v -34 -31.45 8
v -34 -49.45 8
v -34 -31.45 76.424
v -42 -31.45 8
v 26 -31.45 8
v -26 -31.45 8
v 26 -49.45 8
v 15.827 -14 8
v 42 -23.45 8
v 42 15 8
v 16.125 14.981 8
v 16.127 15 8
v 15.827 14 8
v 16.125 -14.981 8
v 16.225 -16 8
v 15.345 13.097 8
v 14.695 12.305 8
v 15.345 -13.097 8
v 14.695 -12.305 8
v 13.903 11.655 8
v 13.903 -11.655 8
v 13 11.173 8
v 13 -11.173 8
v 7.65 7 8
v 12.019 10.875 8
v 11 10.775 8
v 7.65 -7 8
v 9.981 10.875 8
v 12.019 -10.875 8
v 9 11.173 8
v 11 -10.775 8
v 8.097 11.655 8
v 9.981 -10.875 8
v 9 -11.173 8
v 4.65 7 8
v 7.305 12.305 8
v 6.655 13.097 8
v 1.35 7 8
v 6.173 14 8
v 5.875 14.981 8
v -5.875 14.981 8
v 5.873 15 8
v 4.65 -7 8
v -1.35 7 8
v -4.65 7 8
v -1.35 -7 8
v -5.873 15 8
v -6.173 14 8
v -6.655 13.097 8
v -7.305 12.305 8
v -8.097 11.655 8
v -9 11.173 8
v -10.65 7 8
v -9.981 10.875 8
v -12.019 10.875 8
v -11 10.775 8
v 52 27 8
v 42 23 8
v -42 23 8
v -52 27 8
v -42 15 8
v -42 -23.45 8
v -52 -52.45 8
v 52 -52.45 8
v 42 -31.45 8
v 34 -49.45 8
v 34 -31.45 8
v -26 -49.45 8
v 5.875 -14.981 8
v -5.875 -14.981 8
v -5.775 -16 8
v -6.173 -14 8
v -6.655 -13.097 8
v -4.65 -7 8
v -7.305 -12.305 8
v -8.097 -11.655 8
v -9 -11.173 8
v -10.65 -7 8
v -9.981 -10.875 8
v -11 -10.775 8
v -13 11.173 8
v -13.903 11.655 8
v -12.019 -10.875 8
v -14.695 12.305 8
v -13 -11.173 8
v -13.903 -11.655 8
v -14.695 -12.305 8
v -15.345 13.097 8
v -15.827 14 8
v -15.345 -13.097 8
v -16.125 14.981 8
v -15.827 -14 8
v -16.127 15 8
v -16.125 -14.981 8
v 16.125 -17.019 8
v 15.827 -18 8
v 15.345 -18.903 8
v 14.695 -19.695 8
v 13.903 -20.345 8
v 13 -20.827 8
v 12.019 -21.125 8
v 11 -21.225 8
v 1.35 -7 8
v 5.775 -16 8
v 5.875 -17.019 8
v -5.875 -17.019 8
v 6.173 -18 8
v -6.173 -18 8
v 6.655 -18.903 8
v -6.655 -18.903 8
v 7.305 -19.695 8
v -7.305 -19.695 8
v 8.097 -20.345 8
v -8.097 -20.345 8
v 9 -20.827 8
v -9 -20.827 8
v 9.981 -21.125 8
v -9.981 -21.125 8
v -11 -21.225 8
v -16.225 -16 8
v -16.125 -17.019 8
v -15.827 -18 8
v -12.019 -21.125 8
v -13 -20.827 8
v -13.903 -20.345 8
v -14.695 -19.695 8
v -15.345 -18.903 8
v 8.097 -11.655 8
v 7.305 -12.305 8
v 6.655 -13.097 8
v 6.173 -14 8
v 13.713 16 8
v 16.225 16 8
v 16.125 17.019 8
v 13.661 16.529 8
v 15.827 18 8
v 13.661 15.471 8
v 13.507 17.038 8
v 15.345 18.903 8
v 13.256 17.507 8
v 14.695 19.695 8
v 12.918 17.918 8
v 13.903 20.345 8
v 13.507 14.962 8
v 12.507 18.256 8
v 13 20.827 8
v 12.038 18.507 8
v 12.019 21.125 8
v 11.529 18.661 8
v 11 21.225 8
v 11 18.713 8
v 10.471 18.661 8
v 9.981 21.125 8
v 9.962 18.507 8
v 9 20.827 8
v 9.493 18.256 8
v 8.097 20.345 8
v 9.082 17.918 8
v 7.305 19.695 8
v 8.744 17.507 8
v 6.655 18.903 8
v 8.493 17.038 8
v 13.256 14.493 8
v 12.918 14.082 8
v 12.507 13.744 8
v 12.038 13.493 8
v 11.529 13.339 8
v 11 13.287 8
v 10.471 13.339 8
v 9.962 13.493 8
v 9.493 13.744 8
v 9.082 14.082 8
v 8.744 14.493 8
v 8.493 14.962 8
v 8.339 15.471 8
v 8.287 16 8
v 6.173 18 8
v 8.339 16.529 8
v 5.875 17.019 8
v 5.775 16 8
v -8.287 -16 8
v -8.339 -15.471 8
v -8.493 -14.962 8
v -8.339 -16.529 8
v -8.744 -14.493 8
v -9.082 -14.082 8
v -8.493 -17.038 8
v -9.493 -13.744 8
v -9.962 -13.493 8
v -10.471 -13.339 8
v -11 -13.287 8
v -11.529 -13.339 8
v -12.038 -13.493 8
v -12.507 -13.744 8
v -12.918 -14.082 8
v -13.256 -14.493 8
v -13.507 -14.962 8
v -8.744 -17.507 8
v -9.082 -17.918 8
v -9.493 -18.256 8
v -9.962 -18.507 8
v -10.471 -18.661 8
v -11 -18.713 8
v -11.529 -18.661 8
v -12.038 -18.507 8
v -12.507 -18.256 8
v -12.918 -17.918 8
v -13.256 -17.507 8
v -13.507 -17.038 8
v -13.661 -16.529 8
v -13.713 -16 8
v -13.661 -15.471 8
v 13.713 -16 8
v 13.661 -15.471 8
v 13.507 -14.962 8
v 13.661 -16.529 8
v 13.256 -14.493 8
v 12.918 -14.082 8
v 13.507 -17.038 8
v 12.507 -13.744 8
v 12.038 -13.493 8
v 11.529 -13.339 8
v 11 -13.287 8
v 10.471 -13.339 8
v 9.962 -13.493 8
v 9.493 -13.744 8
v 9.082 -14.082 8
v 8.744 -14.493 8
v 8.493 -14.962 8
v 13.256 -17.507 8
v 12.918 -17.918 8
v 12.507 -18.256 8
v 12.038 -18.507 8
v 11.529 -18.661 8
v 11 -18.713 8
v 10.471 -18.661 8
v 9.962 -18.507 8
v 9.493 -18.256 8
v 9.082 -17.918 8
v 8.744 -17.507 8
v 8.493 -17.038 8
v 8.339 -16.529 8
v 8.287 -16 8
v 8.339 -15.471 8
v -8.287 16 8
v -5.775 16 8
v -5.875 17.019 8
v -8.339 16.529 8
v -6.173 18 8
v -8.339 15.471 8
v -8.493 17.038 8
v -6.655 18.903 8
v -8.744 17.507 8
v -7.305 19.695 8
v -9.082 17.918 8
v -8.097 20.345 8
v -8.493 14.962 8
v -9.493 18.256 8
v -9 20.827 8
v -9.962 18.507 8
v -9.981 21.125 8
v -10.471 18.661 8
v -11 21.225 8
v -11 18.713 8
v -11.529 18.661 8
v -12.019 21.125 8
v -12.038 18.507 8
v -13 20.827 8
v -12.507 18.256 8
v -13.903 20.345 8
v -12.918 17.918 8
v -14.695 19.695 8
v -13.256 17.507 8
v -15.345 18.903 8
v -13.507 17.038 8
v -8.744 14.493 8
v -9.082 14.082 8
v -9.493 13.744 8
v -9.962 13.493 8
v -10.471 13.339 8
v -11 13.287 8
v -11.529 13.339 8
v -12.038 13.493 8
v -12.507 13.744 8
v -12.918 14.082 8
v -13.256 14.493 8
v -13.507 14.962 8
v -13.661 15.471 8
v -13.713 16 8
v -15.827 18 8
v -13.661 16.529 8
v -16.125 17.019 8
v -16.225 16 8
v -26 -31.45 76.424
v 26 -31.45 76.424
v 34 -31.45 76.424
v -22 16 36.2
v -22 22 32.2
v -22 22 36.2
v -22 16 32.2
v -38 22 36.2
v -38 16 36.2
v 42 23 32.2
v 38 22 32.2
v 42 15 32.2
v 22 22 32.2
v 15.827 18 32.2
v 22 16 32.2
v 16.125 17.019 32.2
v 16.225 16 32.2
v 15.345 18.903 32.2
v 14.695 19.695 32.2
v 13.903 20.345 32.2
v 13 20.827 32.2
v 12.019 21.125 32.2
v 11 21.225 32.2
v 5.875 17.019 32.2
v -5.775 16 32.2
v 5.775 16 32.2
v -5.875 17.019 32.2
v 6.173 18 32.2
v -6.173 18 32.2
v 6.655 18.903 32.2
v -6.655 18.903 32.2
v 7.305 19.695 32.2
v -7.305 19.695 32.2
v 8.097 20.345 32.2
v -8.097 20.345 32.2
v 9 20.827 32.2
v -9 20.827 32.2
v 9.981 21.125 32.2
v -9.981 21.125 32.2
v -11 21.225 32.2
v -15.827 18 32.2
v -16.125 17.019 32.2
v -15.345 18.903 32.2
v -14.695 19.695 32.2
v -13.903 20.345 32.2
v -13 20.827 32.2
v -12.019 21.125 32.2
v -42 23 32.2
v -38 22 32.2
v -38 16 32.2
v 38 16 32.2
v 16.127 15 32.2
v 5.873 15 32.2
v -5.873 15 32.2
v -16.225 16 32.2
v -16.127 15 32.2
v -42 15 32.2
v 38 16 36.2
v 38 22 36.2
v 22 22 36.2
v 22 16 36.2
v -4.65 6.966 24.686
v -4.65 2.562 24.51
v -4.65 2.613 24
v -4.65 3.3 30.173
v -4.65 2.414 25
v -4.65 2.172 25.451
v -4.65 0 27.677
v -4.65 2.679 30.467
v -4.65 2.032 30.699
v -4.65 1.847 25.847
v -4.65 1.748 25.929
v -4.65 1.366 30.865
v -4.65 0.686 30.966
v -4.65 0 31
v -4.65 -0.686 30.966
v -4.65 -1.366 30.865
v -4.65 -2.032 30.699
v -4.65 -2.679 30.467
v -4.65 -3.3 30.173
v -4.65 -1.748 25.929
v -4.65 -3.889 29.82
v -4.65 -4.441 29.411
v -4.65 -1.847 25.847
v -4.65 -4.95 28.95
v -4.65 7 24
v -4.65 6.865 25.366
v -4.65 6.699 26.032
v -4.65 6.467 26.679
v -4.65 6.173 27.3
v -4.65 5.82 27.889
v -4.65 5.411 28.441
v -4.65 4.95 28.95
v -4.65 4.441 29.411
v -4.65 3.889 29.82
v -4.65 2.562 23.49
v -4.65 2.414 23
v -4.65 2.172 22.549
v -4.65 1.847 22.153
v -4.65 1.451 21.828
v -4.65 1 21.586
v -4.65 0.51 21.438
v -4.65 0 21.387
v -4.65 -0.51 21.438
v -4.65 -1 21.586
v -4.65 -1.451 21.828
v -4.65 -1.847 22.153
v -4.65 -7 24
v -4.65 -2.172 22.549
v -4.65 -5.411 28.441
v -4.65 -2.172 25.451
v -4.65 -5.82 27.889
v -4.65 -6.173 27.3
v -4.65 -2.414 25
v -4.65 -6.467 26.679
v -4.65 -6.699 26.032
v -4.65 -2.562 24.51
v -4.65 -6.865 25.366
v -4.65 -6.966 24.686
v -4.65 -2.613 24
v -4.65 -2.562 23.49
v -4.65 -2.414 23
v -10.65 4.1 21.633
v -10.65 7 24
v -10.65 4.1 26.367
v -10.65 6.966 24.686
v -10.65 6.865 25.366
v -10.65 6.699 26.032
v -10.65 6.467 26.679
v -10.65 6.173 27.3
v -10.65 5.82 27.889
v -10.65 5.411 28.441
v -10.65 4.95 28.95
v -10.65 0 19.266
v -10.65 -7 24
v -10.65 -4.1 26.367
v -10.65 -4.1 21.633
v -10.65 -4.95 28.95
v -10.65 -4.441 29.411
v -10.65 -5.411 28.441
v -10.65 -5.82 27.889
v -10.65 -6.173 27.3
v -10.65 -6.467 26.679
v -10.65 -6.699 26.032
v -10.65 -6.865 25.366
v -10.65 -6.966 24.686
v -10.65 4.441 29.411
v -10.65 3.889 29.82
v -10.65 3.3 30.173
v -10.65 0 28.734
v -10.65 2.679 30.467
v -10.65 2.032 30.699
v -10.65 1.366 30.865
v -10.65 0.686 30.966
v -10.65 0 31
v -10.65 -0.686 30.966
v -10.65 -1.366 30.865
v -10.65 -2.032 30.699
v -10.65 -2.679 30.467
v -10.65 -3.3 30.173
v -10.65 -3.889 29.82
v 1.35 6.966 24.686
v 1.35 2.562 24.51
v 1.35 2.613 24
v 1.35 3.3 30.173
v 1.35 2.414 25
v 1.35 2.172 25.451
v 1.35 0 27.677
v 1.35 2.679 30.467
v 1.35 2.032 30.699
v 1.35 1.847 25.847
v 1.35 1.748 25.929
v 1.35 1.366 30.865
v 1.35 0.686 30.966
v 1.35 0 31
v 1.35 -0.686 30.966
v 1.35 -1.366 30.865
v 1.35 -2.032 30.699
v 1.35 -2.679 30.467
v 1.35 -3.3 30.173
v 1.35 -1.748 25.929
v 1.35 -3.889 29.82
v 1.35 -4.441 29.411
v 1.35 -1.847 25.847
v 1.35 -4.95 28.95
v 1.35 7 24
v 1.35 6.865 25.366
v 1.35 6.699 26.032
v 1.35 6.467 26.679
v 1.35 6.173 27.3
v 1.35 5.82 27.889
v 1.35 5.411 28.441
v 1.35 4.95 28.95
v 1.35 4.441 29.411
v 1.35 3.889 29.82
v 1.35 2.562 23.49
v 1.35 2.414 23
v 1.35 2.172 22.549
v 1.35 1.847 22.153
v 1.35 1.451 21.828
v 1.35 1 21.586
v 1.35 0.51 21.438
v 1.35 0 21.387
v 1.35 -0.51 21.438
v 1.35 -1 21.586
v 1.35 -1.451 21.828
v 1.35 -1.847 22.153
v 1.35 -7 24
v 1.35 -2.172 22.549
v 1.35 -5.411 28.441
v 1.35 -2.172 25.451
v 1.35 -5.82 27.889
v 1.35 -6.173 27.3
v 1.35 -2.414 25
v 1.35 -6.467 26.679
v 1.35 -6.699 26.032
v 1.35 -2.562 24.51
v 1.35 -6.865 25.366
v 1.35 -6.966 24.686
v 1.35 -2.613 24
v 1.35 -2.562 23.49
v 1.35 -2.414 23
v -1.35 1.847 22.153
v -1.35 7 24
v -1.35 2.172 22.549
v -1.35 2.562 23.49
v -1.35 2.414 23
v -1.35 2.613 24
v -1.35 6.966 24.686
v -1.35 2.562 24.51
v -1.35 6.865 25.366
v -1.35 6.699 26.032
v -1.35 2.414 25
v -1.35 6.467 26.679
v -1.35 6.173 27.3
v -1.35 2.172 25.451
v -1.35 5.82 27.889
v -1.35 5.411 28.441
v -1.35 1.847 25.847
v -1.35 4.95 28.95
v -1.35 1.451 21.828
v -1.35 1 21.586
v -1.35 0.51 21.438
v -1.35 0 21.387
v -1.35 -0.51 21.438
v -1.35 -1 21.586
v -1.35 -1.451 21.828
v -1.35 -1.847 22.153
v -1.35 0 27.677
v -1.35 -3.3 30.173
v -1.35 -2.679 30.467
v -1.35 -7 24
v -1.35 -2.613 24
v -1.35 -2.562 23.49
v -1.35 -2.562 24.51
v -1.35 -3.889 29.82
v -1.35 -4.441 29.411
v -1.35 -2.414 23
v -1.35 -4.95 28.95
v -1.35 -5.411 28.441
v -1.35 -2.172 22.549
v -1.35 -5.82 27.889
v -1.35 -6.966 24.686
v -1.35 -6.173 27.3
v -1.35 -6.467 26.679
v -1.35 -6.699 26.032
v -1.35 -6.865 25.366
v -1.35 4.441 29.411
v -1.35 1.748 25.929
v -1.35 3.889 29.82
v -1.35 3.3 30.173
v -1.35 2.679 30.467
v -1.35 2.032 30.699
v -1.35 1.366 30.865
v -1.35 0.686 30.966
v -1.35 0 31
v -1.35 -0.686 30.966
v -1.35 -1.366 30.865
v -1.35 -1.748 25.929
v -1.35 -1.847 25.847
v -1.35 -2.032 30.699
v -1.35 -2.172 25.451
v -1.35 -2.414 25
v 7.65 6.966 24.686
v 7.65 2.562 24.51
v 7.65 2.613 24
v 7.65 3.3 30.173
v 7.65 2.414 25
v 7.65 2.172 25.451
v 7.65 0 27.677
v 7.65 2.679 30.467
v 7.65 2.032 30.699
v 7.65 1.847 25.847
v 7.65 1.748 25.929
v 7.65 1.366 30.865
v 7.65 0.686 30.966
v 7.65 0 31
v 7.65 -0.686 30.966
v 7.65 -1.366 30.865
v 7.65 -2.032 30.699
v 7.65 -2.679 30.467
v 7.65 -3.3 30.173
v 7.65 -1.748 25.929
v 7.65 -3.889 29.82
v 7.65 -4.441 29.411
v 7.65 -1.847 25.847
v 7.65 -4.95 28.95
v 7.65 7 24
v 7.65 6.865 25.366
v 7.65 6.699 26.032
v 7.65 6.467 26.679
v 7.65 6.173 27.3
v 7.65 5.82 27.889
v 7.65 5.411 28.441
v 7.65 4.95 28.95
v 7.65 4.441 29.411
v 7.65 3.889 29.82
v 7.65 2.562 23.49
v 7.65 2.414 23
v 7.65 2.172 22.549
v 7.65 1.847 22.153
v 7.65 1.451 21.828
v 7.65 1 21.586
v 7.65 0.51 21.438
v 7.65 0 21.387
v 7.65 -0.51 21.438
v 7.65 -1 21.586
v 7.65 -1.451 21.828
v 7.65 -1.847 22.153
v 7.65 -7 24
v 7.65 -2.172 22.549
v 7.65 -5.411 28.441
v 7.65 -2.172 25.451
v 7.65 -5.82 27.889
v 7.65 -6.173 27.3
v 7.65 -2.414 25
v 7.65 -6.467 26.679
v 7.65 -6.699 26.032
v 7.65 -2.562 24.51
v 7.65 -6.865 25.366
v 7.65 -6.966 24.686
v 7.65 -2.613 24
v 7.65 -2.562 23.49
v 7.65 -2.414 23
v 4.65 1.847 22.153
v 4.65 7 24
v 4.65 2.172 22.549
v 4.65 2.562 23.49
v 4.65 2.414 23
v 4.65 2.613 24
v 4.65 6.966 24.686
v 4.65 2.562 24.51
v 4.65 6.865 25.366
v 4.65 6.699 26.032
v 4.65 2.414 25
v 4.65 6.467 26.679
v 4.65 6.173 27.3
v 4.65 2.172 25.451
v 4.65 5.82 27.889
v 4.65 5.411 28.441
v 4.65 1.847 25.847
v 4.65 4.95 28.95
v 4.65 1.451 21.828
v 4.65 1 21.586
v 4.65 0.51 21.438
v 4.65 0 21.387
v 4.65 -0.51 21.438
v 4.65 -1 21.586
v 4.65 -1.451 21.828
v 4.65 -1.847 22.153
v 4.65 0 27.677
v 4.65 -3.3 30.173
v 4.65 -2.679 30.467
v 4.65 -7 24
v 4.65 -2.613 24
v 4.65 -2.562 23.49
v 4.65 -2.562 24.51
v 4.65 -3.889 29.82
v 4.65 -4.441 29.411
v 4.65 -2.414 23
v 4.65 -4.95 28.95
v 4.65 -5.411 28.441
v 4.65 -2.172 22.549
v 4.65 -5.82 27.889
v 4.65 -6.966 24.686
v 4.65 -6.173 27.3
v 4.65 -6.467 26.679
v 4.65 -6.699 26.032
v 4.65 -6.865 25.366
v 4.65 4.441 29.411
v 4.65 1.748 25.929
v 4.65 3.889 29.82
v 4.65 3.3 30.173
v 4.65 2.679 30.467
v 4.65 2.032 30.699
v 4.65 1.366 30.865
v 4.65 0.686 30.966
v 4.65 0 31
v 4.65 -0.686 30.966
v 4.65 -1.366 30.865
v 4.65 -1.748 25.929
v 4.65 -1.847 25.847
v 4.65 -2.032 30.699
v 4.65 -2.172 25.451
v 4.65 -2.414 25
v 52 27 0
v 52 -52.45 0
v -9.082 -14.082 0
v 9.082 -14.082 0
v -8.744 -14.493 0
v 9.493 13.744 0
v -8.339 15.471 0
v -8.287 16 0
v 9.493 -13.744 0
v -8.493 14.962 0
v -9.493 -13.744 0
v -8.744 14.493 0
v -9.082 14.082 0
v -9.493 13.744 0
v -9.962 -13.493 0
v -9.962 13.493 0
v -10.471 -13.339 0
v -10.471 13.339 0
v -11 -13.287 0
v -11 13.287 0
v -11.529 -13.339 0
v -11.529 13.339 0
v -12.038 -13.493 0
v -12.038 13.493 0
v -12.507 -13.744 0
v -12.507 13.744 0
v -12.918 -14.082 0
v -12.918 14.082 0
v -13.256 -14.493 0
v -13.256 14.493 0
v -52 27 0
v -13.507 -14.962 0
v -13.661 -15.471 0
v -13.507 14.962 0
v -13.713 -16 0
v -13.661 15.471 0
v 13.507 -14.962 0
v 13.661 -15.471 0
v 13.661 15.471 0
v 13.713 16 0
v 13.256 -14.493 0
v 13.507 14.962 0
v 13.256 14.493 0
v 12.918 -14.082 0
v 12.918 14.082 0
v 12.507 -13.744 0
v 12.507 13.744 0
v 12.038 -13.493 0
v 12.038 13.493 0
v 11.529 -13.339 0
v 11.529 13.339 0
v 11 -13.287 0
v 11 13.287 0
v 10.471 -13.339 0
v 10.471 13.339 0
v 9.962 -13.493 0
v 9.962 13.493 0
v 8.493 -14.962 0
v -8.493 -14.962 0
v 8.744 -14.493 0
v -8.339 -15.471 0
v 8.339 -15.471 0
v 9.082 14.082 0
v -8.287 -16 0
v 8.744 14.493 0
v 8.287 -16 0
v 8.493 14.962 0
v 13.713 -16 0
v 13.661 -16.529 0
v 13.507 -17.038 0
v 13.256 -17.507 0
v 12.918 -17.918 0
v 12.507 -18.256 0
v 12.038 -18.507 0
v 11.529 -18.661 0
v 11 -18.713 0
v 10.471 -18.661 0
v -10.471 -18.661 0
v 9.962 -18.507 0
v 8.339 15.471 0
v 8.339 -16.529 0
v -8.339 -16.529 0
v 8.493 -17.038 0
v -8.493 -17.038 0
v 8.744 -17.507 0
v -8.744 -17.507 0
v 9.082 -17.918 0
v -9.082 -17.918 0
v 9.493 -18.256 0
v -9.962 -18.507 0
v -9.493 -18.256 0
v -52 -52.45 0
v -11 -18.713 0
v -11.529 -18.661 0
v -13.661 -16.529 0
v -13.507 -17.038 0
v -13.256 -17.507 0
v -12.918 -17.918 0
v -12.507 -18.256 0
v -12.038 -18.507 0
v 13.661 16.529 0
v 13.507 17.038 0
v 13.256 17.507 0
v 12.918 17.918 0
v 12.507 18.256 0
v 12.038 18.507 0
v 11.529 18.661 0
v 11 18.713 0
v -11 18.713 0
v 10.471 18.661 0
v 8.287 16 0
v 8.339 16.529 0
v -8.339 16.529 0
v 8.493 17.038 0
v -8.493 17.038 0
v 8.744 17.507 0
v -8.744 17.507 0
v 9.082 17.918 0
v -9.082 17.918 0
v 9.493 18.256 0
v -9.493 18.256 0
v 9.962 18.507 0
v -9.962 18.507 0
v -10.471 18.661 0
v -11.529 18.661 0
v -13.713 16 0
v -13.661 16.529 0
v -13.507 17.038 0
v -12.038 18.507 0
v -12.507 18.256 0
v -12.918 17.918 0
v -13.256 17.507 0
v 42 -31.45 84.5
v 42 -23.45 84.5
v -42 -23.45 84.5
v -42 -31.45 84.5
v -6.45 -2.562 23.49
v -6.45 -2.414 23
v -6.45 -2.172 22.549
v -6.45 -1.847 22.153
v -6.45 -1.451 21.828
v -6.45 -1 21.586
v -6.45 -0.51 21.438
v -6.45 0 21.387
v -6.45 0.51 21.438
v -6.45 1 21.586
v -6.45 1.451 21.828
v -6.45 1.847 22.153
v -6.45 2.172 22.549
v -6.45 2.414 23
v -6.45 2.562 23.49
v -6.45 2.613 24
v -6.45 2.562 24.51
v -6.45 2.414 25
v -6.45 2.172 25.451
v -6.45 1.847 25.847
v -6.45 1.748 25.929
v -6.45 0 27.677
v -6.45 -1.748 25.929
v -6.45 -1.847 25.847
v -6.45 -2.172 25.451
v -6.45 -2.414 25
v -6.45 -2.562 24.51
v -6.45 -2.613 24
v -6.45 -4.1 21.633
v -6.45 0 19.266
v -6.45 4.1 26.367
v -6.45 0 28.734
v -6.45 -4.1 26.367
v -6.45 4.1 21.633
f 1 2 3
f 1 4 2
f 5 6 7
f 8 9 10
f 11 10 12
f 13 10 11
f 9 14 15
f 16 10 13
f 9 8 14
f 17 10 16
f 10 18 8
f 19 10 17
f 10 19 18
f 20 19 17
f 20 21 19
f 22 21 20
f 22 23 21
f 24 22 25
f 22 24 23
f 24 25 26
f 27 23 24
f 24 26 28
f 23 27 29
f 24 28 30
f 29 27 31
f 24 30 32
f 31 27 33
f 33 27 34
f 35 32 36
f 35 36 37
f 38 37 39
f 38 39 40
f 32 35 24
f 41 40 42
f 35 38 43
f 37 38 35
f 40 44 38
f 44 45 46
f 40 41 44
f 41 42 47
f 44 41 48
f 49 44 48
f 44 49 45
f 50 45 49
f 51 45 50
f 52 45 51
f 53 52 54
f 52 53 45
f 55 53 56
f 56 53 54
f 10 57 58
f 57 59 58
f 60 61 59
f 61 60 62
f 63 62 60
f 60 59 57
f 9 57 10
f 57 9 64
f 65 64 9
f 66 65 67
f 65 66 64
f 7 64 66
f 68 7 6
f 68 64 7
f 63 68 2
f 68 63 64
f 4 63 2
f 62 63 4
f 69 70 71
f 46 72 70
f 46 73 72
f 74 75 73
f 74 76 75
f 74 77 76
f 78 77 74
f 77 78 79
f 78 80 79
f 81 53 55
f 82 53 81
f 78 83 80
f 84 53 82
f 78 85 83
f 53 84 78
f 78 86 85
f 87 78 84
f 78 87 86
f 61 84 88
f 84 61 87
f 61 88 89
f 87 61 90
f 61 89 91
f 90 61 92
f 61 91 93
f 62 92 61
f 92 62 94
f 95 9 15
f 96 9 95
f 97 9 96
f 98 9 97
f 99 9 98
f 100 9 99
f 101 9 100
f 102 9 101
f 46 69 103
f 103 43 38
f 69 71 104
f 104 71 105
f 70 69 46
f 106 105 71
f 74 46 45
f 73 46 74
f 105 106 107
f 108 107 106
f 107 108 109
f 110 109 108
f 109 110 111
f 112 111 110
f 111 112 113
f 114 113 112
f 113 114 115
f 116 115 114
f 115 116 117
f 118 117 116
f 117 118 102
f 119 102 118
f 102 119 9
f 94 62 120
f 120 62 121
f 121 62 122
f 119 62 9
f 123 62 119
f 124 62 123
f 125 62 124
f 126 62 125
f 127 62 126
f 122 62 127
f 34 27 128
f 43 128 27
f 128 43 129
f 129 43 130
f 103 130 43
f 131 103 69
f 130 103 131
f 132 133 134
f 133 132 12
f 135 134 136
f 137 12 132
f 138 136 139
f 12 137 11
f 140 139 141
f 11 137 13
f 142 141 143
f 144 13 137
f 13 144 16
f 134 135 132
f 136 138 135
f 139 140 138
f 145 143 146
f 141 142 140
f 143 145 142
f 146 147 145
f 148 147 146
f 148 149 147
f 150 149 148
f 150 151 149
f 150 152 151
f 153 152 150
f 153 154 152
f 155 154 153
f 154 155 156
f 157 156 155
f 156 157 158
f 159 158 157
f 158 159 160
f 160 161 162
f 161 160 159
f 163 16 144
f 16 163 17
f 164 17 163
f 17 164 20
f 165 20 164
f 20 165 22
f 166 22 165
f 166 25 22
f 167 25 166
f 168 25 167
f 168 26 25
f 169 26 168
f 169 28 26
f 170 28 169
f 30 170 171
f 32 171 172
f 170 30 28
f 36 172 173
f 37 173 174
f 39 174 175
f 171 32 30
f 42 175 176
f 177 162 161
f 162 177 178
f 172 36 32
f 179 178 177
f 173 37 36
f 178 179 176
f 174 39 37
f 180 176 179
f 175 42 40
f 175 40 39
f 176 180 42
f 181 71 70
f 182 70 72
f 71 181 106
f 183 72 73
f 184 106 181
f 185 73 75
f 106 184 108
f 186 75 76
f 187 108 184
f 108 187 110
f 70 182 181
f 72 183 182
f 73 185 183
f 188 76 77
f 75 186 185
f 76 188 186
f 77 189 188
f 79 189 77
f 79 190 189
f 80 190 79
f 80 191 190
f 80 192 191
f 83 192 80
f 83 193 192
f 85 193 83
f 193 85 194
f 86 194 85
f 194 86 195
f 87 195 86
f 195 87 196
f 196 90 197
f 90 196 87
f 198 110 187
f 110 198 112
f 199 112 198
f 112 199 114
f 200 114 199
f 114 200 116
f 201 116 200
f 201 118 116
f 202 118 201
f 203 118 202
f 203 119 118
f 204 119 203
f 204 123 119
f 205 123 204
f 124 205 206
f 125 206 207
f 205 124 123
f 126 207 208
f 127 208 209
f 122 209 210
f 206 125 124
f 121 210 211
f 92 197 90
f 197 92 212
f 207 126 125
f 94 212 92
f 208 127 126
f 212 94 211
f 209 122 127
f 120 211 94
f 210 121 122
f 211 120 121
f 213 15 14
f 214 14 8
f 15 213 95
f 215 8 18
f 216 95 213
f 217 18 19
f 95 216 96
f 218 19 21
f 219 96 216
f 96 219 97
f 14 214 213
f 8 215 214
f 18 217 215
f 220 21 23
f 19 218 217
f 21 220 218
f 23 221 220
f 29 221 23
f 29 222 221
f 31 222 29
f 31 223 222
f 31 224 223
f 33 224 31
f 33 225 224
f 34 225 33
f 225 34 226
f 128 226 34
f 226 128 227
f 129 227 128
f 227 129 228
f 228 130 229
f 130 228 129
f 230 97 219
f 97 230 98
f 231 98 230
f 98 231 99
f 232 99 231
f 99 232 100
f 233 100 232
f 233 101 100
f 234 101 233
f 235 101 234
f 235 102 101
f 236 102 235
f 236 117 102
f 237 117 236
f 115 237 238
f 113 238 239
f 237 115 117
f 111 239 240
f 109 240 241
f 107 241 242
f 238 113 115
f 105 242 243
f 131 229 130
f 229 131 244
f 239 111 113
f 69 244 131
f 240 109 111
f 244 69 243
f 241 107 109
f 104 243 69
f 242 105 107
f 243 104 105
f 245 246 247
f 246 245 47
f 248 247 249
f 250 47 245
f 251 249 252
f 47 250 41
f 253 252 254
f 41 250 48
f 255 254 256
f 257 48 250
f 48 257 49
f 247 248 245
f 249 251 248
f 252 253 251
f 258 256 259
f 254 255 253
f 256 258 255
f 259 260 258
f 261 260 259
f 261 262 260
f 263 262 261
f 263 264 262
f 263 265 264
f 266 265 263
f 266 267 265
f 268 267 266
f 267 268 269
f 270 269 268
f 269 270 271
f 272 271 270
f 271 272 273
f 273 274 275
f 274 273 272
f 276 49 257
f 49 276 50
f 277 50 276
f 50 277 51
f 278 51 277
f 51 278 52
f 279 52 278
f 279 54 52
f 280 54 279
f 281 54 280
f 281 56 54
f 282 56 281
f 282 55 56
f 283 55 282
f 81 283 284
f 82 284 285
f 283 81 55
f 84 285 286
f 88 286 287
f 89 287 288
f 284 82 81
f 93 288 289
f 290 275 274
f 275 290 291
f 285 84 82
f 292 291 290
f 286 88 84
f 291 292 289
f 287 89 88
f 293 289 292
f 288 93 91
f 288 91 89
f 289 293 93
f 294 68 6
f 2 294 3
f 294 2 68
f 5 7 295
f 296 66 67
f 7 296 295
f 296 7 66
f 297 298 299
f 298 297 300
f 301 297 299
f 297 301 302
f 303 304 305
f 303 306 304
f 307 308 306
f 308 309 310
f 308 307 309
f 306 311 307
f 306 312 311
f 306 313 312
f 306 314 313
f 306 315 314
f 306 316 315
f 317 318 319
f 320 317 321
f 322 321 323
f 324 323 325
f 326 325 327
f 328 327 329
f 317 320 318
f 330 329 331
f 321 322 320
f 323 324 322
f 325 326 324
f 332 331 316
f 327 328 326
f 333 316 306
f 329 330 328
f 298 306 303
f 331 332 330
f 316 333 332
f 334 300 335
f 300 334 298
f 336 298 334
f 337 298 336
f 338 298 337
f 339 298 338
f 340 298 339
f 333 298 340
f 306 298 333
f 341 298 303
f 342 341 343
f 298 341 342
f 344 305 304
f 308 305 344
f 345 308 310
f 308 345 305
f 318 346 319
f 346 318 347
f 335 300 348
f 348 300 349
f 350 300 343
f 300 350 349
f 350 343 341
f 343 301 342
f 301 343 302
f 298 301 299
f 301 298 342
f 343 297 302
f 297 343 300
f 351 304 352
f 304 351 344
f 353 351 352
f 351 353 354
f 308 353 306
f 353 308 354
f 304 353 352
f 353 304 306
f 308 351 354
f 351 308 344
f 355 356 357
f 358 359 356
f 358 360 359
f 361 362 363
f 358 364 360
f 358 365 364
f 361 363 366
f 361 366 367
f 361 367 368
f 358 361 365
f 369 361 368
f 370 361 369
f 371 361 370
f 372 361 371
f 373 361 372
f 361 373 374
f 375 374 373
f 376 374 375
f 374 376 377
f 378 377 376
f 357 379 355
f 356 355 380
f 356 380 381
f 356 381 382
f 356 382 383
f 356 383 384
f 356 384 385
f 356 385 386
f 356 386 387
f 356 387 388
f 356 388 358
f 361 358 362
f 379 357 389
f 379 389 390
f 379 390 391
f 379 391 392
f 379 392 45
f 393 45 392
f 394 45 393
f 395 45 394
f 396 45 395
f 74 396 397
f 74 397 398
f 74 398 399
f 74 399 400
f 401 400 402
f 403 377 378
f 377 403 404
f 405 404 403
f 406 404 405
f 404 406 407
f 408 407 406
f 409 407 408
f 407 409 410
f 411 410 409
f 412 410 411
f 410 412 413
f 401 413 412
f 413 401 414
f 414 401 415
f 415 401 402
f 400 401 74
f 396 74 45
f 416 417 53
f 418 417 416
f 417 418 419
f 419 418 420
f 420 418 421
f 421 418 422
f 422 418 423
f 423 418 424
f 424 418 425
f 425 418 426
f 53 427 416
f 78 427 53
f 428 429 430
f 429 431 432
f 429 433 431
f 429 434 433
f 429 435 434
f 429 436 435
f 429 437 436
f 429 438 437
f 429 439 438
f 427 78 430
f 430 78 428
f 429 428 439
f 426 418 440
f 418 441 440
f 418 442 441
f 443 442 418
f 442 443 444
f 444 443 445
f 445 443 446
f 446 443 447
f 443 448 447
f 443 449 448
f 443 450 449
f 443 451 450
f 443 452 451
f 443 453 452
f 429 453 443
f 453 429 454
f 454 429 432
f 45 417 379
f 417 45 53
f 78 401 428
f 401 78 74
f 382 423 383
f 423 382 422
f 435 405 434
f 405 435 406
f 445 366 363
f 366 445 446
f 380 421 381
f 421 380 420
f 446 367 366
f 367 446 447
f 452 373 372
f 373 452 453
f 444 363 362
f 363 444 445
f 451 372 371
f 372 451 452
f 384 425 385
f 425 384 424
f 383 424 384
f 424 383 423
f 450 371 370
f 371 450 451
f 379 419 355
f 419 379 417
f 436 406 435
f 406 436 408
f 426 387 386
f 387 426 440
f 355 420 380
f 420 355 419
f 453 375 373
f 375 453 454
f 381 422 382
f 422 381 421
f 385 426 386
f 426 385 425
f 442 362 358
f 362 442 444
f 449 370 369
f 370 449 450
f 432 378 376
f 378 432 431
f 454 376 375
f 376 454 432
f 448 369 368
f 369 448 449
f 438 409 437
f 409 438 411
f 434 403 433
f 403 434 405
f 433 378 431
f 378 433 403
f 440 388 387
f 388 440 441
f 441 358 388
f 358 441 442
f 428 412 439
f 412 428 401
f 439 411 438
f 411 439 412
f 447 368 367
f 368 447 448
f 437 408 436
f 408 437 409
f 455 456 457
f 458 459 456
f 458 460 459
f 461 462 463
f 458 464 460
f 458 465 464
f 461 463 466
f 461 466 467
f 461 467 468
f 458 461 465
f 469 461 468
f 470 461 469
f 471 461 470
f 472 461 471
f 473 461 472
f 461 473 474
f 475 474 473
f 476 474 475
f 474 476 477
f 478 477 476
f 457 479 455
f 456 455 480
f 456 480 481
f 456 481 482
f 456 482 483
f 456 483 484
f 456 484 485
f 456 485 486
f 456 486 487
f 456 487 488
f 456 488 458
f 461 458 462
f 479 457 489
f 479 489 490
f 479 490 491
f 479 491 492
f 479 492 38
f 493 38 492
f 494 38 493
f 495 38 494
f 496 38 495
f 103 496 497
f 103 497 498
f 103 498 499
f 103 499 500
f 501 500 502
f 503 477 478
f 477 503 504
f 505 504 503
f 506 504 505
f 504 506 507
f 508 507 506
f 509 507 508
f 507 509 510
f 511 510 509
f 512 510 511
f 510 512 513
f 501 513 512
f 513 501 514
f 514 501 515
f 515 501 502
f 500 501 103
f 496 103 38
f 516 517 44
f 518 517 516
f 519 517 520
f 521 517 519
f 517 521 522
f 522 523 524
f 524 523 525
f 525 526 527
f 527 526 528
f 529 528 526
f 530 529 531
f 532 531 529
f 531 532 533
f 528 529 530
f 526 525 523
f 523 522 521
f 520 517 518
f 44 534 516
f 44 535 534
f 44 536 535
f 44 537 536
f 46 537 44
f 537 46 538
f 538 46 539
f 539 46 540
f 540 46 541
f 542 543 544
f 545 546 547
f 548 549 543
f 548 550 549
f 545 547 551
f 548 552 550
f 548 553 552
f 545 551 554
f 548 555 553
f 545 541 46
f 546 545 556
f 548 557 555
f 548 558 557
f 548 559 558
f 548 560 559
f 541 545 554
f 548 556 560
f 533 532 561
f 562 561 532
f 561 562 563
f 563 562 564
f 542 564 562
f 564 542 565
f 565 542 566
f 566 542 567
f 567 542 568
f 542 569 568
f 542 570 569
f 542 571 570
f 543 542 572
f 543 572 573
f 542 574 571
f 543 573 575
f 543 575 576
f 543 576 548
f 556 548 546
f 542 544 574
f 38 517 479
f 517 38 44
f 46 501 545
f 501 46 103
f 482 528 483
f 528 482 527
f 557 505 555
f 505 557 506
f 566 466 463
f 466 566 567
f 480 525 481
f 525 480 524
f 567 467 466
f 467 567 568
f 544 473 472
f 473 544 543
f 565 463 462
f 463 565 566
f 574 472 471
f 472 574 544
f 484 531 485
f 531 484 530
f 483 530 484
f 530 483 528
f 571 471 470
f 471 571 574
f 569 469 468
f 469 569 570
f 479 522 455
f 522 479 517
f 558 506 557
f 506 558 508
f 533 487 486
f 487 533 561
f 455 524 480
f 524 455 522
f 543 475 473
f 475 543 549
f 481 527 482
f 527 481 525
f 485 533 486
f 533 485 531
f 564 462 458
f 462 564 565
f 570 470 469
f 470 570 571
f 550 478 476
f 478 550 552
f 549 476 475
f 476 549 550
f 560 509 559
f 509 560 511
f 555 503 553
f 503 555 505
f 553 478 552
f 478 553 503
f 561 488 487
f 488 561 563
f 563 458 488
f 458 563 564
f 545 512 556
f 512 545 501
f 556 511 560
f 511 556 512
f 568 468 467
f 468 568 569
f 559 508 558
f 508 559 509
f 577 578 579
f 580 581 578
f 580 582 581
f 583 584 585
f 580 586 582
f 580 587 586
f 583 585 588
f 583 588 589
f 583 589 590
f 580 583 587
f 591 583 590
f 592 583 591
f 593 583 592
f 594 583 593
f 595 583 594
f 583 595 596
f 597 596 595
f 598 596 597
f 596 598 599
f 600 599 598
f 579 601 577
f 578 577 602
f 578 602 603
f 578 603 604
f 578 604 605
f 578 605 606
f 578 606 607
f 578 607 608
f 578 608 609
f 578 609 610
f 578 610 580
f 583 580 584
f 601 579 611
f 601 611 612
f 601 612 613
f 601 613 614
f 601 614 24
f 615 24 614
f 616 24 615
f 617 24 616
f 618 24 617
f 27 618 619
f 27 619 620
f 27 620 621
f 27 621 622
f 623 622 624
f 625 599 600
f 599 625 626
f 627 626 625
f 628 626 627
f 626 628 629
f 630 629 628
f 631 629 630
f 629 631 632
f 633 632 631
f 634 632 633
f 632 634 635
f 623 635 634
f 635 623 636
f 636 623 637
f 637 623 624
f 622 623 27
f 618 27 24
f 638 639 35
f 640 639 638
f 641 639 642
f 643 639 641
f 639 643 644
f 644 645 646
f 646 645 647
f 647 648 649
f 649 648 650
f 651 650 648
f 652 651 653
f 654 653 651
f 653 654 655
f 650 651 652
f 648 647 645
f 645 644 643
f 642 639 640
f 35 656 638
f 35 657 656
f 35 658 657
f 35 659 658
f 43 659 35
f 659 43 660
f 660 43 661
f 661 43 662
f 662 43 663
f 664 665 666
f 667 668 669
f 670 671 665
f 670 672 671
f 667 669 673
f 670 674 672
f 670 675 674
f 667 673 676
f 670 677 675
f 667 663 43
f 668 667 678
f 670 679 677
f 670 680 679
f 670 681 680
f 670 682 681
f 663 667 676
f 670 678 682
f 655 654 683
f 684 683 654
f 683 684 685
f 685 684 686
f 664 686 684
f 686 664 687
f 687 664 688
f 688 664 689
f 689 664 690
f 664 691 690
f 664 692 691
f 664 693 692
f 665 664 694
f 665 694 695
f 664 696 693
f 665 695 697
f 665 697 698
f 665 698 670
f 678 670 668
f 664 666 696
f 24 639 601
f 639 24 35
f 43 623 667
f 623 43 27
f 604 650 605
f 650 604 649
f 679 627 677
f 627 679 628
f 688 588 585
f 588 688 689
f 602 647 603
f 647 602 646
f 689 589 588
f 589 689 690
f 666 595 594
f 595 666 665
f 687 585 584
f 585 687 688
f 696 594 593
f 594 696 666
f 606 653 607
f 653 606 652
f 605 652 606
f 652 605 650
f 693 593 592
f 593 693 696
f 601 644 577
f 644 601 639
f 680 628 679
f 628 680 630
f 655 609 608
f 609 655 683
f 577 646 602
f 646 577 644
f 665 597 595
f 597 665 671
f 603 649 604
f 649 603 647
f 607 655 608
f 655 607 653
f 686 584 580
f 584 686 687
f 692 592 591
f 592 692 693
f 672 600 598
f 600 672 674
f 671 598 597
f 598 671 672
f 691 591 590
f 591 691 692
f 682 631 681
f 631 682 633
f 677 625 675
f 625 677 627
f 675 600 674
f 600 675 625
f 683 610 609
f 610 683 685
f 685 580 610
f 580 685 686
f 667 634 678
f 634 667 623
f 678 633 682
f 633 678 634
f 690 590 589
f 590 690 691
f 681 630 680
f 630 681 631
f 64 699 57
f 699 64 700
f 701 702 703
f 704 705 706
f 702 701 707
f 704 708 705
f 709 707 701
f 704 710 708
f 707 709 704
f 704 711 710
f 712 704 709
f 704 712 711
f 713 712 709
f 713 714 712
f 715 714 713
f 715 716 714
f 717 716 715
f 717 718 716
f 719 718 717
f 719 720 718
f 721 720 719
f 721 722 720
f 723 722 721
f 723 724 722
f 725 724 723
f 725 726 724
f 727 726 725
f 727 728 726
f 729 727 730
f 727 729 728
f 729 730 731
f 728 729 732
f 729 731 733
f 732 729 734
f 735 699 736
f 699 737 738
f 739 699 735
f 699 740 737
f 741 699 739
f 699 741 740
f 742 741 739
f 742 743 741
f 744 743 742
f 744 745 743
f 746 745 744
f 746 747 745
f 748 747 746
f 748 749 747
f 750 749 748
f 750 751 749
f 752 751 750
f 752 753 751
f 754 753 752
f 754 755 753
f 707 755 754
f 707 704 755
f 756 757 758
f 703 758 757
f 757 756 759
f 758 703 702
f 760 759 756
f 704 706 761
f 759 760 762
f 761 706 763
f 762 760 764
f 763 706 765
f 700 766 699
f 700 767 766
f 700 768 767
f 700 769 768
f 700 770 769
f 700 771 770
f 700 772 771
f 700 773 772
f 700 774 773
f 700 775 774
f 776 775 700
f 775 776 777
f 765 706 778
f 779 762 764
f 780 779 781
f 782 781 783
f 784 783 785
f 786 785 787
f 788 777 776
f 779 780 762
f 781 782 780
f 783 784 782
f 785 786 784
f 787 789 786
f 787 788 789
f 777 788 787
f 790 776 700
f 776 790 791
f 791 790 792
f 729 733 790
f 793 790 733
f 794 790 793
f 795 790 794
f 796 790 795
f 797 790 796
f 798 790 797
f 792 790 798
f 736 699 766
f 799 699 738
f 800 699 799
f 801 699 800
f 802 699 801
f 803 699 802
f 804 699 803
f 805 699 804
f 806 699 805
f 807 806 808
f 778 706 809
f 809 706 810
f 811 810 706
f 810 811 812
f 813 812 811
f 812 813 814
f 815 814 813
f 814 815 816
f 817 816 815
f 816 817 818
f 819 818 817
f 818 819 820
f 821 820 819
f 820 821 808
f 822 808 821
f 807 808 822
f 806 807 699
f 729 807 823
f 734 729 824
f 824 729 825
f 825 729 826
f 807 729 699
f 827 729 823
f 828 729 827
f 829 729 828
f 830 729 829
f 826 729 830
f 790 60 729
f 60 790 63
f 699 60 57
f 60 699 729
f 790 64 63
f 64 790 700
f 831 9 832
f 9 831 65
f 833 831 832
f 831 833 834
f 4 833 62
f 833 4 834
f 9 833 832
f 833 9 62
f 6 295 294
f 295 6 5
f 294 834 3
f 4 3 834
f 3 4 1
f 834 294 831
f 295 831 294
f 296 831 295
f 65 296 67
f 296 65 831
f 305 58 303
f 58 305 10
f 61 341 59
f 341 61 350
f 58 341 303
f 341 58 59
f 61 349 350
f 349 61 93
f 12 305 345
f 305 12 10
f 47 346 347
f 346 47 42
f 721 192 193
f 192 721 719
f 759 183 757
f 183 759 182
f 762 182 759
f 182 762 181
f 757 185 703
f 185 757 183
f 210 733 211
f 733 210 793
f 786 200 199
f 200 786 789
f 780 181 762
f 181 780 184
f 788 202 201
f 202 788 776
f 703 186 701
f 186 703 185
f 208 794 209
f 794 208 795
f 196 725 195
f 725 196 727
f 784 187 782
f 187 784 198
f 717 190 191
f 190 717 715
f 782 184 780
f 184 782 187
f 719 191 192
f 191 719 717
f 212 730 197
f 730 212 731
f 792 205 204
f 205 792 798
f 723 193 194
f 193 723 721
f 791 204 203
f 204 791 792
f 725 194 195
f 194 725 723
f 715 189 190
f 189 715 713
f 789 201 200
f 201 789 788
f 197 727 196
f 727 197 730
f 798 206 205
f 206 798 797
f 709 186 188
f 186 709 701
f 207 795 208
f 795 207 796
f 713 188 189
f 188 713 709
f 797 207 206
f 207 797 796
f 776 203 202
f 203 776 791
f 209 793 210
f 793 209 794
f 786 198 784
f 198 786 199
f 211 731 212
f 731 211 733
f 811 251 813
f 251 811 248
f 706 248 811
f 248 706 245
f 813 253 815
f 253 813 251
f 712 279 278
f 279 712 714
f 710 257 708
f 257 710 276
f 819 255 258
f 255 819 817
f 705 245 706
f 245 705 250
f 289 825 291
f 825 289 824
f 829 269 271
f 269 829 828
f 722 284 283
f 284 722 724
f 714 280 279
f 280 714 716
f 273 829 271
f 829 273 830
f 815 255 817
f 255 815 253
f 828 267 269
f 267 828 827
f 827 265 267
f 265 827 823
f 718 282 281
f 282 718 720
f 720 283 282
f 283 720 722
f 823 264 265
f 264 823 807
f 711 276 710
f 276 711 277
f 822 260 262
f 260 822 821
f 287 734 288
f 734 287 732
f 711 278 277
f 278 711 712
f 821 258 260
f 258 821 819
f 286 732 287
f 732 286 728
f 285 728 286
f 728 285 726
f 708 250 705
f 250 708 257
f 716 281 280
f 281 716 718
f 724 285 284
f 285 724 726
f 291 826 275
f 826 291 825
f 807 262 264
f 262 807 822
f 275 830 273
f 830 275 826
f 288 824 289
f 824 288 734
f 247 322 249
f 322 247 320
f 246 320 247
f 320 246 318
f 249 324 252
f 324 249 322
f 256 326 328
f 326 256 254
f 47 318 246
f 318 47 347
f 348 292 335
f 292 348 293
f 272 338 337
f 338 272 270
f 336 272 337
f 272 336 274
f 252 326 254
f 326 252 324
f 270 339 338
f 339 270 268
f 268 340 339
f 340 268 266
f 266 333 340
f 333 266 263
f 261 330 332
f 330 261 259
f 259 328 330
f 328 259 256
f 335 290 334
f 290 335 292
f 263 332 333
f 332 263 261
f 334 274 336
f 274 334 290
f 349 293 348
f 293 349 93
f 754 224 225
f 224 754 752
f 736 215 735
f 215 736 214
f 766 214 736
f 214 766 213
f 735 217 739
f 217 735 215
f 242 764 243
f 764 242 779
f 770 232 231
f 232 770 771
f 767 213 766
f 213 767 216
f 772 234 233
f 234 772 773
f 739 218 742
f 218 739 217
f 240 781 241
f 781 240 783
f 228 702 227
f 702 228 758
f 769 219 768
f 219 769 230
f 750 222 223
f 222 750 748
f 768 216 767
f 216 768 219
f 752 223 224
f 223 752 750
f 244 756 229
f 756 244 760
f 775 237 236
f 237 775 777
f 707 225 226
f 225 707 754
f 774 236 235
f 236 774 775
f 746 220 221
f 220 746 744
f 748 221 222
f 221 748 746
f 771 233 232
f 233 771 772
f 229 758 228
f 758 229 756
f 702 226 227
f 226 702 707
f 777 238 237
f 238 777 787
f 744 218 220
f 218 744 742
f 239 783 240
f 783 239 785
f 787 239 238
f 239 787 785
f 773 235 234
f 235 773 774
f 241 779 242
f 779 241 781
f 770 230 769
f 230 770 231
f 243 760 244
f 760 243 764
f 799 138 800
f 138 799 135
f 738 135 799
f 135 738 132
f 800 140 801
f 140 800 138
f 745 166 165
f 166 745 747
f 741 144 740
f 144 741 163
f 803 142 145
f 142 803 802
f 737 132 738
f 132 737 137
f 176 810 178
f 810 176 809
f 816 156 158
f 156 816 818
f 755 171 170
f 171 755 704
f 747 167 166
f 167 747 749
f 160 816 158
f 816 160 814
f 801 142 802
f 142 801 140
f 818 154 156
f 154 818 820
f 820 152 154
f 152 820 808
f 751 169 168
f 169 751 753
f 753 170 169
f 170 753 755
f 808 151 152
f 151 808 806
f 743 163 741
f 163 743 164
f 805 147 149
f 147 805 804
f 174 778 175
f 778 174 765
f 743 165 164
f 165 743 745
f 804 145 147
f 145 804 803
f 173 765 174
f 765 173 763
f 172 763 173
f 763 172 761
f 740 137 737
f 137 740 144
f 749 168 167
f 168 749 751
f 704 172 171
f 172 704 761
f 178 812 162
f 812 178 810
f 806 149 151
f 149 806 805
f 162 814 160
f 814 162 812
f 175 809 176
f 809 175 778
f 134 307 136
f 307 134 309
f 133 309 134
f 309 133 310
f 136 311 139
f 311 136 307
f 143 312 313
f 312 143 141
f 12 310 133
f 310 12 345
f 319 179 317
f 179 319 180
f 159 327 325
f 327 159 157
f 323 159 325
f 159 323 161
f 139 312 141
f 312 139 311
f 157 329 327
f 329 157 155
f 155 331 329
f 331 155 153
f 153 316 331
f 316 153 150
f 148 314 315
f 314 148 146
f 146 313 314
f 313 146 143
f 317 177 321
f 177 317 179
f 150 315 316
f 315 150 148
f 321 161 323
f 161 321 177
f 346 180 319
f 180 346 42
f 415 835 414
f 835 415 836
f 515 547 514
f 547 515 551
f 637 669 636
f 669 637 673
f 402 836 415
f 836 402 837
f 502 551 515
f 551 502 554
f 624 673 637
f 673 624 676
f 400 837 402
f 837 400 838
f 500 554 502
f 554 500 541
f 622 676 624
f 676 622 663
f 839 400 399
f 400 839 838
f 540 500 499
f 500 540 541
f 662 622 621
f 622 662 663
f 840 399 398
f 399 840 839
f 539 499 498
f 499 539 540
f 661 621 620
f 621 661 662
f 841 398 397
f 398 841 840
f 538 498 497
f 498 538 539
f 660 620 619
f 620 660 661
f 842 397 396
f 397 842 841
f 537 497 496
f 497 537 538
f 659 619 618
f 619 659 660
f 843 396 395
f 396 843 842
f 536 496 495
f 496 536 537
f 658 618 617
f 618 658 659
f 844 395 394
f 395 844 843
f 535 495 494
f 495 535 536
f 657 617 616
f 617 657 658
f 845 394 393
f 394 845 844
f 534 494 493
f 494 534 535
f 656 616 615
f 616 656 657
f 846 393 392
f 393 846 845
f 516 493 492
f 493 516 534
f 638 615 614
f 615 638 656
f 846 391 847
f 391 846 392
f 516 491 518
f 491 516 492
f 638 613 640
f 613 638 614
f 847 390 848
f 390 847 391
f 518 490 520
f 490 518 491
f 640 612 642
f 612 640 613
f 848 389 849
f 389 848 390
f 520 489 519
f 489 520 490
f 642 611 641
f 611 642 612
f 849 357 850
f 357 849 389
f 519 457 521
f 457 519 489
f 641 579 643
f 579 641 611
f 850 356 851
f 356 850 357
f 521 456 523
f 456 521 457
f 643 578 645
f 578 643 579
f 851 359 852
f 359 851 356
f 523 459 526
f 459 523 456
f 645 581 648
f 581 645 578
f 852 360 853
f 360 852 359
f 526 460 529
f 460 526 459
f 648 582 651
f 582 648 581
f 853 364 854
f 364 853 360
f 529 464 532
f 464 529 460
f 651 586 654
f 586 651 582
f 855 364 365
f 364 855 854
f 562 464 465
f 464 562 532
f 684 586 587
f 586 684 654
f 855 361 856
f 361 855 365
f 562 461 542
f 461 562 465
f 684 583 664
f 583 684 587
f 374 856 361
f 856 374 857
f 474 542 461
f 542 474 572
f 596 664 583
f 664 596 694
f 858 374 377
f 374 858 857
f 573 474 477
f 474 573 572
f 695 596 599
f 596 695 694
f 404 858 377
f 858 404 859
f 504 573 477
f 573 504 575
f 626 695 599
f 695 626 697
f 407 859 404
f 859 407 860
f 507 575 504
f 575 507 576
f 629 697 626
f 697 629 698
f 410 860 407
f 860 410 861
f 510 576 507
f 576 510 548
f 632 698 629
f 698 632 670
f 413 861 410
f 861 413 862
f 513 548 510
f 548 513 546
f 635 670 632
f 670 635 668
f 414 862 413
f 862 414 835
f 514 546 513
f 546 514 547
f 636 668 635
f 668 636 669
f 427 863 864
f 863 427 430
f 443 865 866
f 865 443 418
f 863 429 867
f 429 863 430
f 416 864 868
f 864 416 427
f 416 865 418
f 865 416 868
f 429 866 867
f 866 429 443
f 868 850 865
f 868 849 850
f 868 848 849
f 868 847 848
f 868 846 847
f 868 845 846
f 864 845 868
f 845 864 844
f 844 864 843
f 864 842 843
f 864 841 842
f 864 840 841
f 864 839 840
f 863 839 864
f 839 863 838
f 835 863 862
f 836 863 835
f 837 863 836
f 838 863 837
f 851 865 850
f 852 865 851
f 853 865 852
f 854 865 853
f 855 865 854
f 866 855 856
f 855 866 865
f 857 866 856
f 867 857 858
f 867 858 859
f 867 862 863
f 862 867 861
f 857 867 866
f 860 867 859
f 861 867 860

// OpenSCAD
// DJI osmo Action 6固定部品: rear plate + front support, one FDM solid.
// mm; +Y camera front; X screw axis; Z print up. Case shape provisional.
show_case=false;
tab_t=3; tab_gap=3; case_hole=5; body_to_axis=12.5;
fit=0.3; hole_allow=0.2;
case_w=95; case_d=45.9; case_h=75;
rear_gap=0.5; // fit with measured shim/liner, not an operating gap
base_w=104; base_t=8; axis_z=24;
plate_w=84; plate_t=8; plate_above_bottom=48;
rear_gusset_run=18; gusset_t=8; gusset_x=30;
front_y=19; front_wall_t=8; front_span=84;
front_pad_w=16; front_pad_d=6; front_pad_x=30;
front_pad_raise=4; front_gap=0.3;
lug_r=7; nut_side_t=6; head_side_t=3;
nut_af=8.2; nut_depth=4.2; tool_r=14;
$fn=64; eps=0.02;
mid=tab_gap-fit; slot=tab_t+fit;
stack=nut_side_t+2*slot+mid+head_side_t;
left=-(slot+mid/2+nut_side_t);
body_z=axis_z+body_to_axis;
contact_z=body_z-front_gap;
front_top=contact_z-front_pad_raise;
rear_face=-case_d/2-rear_gap; rear_back=rear_face-plate_t;
base_y0=rear_back-rear_gusset_run-3;
base_y1=front_y+front_wall_t/2+4;
plate_top=body_z+plate_above_bottom;
assert(mid>0 && nut_depth<nut_side_t-1);
assert(front_y-front_wall_t/2>tool_r && axis_z-tool_r>base_t);
assert(plate_above_bottom<case_h-15);
assert(gusset_x+gusset_t/2<plate_w/2);
assert(front_pad_x+front_pad_w/2<front_span/2);
assert(rear_gap>=0 && front_gap>=0);
module hole(d,h) { cylinder(d=d/cos(180/32),h=h,$fn=32); }
module roof_hole_x(d,h) {
 r=d/2;
 rotate([0,90,0]) linear_extrude(h) union() {
  circle(r=r/cos(180/32),$fn=32);
  polygon([[-sqrt(2)*r,0],[-r/sqrt(2),r/sqrt(2)],[-r/sqrt(2),-r/sqrt(2)]]);
 }
}
module rear_gusset(x) {
 translate([x-gusset_t/2,0,0])
 multmatrix([[0,0,1,0],[1,0,0,0],[0,1,0,0],[0,0,0,1]])
 linear_extrude(gusset_t)
 polygon([[rear_back-rear_gusset_run,base_t],[rear_back+eps,base_t],[rear_back+eps,plate_top-8]]);
}
module body() {
 difference() {
  union() {
   translate([-base_w/2,base_y0,0]) cube([base_w,base_y1-base_y0,base_t]);
   translate([-plate_w/2,rear_back,base_t]) cube([plate_w,plate_t,plate_top-base_t]);
   for(s=[-1,1]) rear_gusset(s*gusset_x);
   translate([-front_span/2,front_y-front_wall_t/2,base_t]) cube([front_span,front_wall_t,front_top-base_t]);
   for(s=[-1,1]) translate([s*front_pad_x-front_pad_w/2,front_y-front_pad_d/2,front_top]) cube([front_pad_w,front_pad_d,front_pad_raise]);
   // Minimum screw fingers only: rear under-case pedestal removed.
   starts=[left,-mid/2,mid/2+slot]; ts=[nut_side_t,mid,head_side_t];
   for(i=[0:2]) {
    translate([starts[i],-lug_r,base_t]) cube([ts[i],2*lug_r,axis_z-base_t]);
    translate([starts[i],0,axis_z]) rotate([0,90,0]) cylinder(r=lug_r,h=ts[i]);
   }
  }
  translate([left-eps,0,axis_z]) roof_hole_x(case_hole+hole_allow,stack+2*eps);
  translate([left-eps,0,axis_z]) rotate([0,90,0]) cylinder(d=nut_af/cos(30),h=nut_depth+eps,$fn=6);
  for(x=[-11,11],y=[-16,16]) {
   translate([x,y,-eps]) hole(5.4,base_t+2*eps);
   translate([x,y,base_t]) hole(10.4,plate_top);
  }
 }
}
color("SteelBlue") body();
if(show_case) %translate([-case_w/2,-case_d/2,body_z]) cube([case_w,case_d,case_h]);
